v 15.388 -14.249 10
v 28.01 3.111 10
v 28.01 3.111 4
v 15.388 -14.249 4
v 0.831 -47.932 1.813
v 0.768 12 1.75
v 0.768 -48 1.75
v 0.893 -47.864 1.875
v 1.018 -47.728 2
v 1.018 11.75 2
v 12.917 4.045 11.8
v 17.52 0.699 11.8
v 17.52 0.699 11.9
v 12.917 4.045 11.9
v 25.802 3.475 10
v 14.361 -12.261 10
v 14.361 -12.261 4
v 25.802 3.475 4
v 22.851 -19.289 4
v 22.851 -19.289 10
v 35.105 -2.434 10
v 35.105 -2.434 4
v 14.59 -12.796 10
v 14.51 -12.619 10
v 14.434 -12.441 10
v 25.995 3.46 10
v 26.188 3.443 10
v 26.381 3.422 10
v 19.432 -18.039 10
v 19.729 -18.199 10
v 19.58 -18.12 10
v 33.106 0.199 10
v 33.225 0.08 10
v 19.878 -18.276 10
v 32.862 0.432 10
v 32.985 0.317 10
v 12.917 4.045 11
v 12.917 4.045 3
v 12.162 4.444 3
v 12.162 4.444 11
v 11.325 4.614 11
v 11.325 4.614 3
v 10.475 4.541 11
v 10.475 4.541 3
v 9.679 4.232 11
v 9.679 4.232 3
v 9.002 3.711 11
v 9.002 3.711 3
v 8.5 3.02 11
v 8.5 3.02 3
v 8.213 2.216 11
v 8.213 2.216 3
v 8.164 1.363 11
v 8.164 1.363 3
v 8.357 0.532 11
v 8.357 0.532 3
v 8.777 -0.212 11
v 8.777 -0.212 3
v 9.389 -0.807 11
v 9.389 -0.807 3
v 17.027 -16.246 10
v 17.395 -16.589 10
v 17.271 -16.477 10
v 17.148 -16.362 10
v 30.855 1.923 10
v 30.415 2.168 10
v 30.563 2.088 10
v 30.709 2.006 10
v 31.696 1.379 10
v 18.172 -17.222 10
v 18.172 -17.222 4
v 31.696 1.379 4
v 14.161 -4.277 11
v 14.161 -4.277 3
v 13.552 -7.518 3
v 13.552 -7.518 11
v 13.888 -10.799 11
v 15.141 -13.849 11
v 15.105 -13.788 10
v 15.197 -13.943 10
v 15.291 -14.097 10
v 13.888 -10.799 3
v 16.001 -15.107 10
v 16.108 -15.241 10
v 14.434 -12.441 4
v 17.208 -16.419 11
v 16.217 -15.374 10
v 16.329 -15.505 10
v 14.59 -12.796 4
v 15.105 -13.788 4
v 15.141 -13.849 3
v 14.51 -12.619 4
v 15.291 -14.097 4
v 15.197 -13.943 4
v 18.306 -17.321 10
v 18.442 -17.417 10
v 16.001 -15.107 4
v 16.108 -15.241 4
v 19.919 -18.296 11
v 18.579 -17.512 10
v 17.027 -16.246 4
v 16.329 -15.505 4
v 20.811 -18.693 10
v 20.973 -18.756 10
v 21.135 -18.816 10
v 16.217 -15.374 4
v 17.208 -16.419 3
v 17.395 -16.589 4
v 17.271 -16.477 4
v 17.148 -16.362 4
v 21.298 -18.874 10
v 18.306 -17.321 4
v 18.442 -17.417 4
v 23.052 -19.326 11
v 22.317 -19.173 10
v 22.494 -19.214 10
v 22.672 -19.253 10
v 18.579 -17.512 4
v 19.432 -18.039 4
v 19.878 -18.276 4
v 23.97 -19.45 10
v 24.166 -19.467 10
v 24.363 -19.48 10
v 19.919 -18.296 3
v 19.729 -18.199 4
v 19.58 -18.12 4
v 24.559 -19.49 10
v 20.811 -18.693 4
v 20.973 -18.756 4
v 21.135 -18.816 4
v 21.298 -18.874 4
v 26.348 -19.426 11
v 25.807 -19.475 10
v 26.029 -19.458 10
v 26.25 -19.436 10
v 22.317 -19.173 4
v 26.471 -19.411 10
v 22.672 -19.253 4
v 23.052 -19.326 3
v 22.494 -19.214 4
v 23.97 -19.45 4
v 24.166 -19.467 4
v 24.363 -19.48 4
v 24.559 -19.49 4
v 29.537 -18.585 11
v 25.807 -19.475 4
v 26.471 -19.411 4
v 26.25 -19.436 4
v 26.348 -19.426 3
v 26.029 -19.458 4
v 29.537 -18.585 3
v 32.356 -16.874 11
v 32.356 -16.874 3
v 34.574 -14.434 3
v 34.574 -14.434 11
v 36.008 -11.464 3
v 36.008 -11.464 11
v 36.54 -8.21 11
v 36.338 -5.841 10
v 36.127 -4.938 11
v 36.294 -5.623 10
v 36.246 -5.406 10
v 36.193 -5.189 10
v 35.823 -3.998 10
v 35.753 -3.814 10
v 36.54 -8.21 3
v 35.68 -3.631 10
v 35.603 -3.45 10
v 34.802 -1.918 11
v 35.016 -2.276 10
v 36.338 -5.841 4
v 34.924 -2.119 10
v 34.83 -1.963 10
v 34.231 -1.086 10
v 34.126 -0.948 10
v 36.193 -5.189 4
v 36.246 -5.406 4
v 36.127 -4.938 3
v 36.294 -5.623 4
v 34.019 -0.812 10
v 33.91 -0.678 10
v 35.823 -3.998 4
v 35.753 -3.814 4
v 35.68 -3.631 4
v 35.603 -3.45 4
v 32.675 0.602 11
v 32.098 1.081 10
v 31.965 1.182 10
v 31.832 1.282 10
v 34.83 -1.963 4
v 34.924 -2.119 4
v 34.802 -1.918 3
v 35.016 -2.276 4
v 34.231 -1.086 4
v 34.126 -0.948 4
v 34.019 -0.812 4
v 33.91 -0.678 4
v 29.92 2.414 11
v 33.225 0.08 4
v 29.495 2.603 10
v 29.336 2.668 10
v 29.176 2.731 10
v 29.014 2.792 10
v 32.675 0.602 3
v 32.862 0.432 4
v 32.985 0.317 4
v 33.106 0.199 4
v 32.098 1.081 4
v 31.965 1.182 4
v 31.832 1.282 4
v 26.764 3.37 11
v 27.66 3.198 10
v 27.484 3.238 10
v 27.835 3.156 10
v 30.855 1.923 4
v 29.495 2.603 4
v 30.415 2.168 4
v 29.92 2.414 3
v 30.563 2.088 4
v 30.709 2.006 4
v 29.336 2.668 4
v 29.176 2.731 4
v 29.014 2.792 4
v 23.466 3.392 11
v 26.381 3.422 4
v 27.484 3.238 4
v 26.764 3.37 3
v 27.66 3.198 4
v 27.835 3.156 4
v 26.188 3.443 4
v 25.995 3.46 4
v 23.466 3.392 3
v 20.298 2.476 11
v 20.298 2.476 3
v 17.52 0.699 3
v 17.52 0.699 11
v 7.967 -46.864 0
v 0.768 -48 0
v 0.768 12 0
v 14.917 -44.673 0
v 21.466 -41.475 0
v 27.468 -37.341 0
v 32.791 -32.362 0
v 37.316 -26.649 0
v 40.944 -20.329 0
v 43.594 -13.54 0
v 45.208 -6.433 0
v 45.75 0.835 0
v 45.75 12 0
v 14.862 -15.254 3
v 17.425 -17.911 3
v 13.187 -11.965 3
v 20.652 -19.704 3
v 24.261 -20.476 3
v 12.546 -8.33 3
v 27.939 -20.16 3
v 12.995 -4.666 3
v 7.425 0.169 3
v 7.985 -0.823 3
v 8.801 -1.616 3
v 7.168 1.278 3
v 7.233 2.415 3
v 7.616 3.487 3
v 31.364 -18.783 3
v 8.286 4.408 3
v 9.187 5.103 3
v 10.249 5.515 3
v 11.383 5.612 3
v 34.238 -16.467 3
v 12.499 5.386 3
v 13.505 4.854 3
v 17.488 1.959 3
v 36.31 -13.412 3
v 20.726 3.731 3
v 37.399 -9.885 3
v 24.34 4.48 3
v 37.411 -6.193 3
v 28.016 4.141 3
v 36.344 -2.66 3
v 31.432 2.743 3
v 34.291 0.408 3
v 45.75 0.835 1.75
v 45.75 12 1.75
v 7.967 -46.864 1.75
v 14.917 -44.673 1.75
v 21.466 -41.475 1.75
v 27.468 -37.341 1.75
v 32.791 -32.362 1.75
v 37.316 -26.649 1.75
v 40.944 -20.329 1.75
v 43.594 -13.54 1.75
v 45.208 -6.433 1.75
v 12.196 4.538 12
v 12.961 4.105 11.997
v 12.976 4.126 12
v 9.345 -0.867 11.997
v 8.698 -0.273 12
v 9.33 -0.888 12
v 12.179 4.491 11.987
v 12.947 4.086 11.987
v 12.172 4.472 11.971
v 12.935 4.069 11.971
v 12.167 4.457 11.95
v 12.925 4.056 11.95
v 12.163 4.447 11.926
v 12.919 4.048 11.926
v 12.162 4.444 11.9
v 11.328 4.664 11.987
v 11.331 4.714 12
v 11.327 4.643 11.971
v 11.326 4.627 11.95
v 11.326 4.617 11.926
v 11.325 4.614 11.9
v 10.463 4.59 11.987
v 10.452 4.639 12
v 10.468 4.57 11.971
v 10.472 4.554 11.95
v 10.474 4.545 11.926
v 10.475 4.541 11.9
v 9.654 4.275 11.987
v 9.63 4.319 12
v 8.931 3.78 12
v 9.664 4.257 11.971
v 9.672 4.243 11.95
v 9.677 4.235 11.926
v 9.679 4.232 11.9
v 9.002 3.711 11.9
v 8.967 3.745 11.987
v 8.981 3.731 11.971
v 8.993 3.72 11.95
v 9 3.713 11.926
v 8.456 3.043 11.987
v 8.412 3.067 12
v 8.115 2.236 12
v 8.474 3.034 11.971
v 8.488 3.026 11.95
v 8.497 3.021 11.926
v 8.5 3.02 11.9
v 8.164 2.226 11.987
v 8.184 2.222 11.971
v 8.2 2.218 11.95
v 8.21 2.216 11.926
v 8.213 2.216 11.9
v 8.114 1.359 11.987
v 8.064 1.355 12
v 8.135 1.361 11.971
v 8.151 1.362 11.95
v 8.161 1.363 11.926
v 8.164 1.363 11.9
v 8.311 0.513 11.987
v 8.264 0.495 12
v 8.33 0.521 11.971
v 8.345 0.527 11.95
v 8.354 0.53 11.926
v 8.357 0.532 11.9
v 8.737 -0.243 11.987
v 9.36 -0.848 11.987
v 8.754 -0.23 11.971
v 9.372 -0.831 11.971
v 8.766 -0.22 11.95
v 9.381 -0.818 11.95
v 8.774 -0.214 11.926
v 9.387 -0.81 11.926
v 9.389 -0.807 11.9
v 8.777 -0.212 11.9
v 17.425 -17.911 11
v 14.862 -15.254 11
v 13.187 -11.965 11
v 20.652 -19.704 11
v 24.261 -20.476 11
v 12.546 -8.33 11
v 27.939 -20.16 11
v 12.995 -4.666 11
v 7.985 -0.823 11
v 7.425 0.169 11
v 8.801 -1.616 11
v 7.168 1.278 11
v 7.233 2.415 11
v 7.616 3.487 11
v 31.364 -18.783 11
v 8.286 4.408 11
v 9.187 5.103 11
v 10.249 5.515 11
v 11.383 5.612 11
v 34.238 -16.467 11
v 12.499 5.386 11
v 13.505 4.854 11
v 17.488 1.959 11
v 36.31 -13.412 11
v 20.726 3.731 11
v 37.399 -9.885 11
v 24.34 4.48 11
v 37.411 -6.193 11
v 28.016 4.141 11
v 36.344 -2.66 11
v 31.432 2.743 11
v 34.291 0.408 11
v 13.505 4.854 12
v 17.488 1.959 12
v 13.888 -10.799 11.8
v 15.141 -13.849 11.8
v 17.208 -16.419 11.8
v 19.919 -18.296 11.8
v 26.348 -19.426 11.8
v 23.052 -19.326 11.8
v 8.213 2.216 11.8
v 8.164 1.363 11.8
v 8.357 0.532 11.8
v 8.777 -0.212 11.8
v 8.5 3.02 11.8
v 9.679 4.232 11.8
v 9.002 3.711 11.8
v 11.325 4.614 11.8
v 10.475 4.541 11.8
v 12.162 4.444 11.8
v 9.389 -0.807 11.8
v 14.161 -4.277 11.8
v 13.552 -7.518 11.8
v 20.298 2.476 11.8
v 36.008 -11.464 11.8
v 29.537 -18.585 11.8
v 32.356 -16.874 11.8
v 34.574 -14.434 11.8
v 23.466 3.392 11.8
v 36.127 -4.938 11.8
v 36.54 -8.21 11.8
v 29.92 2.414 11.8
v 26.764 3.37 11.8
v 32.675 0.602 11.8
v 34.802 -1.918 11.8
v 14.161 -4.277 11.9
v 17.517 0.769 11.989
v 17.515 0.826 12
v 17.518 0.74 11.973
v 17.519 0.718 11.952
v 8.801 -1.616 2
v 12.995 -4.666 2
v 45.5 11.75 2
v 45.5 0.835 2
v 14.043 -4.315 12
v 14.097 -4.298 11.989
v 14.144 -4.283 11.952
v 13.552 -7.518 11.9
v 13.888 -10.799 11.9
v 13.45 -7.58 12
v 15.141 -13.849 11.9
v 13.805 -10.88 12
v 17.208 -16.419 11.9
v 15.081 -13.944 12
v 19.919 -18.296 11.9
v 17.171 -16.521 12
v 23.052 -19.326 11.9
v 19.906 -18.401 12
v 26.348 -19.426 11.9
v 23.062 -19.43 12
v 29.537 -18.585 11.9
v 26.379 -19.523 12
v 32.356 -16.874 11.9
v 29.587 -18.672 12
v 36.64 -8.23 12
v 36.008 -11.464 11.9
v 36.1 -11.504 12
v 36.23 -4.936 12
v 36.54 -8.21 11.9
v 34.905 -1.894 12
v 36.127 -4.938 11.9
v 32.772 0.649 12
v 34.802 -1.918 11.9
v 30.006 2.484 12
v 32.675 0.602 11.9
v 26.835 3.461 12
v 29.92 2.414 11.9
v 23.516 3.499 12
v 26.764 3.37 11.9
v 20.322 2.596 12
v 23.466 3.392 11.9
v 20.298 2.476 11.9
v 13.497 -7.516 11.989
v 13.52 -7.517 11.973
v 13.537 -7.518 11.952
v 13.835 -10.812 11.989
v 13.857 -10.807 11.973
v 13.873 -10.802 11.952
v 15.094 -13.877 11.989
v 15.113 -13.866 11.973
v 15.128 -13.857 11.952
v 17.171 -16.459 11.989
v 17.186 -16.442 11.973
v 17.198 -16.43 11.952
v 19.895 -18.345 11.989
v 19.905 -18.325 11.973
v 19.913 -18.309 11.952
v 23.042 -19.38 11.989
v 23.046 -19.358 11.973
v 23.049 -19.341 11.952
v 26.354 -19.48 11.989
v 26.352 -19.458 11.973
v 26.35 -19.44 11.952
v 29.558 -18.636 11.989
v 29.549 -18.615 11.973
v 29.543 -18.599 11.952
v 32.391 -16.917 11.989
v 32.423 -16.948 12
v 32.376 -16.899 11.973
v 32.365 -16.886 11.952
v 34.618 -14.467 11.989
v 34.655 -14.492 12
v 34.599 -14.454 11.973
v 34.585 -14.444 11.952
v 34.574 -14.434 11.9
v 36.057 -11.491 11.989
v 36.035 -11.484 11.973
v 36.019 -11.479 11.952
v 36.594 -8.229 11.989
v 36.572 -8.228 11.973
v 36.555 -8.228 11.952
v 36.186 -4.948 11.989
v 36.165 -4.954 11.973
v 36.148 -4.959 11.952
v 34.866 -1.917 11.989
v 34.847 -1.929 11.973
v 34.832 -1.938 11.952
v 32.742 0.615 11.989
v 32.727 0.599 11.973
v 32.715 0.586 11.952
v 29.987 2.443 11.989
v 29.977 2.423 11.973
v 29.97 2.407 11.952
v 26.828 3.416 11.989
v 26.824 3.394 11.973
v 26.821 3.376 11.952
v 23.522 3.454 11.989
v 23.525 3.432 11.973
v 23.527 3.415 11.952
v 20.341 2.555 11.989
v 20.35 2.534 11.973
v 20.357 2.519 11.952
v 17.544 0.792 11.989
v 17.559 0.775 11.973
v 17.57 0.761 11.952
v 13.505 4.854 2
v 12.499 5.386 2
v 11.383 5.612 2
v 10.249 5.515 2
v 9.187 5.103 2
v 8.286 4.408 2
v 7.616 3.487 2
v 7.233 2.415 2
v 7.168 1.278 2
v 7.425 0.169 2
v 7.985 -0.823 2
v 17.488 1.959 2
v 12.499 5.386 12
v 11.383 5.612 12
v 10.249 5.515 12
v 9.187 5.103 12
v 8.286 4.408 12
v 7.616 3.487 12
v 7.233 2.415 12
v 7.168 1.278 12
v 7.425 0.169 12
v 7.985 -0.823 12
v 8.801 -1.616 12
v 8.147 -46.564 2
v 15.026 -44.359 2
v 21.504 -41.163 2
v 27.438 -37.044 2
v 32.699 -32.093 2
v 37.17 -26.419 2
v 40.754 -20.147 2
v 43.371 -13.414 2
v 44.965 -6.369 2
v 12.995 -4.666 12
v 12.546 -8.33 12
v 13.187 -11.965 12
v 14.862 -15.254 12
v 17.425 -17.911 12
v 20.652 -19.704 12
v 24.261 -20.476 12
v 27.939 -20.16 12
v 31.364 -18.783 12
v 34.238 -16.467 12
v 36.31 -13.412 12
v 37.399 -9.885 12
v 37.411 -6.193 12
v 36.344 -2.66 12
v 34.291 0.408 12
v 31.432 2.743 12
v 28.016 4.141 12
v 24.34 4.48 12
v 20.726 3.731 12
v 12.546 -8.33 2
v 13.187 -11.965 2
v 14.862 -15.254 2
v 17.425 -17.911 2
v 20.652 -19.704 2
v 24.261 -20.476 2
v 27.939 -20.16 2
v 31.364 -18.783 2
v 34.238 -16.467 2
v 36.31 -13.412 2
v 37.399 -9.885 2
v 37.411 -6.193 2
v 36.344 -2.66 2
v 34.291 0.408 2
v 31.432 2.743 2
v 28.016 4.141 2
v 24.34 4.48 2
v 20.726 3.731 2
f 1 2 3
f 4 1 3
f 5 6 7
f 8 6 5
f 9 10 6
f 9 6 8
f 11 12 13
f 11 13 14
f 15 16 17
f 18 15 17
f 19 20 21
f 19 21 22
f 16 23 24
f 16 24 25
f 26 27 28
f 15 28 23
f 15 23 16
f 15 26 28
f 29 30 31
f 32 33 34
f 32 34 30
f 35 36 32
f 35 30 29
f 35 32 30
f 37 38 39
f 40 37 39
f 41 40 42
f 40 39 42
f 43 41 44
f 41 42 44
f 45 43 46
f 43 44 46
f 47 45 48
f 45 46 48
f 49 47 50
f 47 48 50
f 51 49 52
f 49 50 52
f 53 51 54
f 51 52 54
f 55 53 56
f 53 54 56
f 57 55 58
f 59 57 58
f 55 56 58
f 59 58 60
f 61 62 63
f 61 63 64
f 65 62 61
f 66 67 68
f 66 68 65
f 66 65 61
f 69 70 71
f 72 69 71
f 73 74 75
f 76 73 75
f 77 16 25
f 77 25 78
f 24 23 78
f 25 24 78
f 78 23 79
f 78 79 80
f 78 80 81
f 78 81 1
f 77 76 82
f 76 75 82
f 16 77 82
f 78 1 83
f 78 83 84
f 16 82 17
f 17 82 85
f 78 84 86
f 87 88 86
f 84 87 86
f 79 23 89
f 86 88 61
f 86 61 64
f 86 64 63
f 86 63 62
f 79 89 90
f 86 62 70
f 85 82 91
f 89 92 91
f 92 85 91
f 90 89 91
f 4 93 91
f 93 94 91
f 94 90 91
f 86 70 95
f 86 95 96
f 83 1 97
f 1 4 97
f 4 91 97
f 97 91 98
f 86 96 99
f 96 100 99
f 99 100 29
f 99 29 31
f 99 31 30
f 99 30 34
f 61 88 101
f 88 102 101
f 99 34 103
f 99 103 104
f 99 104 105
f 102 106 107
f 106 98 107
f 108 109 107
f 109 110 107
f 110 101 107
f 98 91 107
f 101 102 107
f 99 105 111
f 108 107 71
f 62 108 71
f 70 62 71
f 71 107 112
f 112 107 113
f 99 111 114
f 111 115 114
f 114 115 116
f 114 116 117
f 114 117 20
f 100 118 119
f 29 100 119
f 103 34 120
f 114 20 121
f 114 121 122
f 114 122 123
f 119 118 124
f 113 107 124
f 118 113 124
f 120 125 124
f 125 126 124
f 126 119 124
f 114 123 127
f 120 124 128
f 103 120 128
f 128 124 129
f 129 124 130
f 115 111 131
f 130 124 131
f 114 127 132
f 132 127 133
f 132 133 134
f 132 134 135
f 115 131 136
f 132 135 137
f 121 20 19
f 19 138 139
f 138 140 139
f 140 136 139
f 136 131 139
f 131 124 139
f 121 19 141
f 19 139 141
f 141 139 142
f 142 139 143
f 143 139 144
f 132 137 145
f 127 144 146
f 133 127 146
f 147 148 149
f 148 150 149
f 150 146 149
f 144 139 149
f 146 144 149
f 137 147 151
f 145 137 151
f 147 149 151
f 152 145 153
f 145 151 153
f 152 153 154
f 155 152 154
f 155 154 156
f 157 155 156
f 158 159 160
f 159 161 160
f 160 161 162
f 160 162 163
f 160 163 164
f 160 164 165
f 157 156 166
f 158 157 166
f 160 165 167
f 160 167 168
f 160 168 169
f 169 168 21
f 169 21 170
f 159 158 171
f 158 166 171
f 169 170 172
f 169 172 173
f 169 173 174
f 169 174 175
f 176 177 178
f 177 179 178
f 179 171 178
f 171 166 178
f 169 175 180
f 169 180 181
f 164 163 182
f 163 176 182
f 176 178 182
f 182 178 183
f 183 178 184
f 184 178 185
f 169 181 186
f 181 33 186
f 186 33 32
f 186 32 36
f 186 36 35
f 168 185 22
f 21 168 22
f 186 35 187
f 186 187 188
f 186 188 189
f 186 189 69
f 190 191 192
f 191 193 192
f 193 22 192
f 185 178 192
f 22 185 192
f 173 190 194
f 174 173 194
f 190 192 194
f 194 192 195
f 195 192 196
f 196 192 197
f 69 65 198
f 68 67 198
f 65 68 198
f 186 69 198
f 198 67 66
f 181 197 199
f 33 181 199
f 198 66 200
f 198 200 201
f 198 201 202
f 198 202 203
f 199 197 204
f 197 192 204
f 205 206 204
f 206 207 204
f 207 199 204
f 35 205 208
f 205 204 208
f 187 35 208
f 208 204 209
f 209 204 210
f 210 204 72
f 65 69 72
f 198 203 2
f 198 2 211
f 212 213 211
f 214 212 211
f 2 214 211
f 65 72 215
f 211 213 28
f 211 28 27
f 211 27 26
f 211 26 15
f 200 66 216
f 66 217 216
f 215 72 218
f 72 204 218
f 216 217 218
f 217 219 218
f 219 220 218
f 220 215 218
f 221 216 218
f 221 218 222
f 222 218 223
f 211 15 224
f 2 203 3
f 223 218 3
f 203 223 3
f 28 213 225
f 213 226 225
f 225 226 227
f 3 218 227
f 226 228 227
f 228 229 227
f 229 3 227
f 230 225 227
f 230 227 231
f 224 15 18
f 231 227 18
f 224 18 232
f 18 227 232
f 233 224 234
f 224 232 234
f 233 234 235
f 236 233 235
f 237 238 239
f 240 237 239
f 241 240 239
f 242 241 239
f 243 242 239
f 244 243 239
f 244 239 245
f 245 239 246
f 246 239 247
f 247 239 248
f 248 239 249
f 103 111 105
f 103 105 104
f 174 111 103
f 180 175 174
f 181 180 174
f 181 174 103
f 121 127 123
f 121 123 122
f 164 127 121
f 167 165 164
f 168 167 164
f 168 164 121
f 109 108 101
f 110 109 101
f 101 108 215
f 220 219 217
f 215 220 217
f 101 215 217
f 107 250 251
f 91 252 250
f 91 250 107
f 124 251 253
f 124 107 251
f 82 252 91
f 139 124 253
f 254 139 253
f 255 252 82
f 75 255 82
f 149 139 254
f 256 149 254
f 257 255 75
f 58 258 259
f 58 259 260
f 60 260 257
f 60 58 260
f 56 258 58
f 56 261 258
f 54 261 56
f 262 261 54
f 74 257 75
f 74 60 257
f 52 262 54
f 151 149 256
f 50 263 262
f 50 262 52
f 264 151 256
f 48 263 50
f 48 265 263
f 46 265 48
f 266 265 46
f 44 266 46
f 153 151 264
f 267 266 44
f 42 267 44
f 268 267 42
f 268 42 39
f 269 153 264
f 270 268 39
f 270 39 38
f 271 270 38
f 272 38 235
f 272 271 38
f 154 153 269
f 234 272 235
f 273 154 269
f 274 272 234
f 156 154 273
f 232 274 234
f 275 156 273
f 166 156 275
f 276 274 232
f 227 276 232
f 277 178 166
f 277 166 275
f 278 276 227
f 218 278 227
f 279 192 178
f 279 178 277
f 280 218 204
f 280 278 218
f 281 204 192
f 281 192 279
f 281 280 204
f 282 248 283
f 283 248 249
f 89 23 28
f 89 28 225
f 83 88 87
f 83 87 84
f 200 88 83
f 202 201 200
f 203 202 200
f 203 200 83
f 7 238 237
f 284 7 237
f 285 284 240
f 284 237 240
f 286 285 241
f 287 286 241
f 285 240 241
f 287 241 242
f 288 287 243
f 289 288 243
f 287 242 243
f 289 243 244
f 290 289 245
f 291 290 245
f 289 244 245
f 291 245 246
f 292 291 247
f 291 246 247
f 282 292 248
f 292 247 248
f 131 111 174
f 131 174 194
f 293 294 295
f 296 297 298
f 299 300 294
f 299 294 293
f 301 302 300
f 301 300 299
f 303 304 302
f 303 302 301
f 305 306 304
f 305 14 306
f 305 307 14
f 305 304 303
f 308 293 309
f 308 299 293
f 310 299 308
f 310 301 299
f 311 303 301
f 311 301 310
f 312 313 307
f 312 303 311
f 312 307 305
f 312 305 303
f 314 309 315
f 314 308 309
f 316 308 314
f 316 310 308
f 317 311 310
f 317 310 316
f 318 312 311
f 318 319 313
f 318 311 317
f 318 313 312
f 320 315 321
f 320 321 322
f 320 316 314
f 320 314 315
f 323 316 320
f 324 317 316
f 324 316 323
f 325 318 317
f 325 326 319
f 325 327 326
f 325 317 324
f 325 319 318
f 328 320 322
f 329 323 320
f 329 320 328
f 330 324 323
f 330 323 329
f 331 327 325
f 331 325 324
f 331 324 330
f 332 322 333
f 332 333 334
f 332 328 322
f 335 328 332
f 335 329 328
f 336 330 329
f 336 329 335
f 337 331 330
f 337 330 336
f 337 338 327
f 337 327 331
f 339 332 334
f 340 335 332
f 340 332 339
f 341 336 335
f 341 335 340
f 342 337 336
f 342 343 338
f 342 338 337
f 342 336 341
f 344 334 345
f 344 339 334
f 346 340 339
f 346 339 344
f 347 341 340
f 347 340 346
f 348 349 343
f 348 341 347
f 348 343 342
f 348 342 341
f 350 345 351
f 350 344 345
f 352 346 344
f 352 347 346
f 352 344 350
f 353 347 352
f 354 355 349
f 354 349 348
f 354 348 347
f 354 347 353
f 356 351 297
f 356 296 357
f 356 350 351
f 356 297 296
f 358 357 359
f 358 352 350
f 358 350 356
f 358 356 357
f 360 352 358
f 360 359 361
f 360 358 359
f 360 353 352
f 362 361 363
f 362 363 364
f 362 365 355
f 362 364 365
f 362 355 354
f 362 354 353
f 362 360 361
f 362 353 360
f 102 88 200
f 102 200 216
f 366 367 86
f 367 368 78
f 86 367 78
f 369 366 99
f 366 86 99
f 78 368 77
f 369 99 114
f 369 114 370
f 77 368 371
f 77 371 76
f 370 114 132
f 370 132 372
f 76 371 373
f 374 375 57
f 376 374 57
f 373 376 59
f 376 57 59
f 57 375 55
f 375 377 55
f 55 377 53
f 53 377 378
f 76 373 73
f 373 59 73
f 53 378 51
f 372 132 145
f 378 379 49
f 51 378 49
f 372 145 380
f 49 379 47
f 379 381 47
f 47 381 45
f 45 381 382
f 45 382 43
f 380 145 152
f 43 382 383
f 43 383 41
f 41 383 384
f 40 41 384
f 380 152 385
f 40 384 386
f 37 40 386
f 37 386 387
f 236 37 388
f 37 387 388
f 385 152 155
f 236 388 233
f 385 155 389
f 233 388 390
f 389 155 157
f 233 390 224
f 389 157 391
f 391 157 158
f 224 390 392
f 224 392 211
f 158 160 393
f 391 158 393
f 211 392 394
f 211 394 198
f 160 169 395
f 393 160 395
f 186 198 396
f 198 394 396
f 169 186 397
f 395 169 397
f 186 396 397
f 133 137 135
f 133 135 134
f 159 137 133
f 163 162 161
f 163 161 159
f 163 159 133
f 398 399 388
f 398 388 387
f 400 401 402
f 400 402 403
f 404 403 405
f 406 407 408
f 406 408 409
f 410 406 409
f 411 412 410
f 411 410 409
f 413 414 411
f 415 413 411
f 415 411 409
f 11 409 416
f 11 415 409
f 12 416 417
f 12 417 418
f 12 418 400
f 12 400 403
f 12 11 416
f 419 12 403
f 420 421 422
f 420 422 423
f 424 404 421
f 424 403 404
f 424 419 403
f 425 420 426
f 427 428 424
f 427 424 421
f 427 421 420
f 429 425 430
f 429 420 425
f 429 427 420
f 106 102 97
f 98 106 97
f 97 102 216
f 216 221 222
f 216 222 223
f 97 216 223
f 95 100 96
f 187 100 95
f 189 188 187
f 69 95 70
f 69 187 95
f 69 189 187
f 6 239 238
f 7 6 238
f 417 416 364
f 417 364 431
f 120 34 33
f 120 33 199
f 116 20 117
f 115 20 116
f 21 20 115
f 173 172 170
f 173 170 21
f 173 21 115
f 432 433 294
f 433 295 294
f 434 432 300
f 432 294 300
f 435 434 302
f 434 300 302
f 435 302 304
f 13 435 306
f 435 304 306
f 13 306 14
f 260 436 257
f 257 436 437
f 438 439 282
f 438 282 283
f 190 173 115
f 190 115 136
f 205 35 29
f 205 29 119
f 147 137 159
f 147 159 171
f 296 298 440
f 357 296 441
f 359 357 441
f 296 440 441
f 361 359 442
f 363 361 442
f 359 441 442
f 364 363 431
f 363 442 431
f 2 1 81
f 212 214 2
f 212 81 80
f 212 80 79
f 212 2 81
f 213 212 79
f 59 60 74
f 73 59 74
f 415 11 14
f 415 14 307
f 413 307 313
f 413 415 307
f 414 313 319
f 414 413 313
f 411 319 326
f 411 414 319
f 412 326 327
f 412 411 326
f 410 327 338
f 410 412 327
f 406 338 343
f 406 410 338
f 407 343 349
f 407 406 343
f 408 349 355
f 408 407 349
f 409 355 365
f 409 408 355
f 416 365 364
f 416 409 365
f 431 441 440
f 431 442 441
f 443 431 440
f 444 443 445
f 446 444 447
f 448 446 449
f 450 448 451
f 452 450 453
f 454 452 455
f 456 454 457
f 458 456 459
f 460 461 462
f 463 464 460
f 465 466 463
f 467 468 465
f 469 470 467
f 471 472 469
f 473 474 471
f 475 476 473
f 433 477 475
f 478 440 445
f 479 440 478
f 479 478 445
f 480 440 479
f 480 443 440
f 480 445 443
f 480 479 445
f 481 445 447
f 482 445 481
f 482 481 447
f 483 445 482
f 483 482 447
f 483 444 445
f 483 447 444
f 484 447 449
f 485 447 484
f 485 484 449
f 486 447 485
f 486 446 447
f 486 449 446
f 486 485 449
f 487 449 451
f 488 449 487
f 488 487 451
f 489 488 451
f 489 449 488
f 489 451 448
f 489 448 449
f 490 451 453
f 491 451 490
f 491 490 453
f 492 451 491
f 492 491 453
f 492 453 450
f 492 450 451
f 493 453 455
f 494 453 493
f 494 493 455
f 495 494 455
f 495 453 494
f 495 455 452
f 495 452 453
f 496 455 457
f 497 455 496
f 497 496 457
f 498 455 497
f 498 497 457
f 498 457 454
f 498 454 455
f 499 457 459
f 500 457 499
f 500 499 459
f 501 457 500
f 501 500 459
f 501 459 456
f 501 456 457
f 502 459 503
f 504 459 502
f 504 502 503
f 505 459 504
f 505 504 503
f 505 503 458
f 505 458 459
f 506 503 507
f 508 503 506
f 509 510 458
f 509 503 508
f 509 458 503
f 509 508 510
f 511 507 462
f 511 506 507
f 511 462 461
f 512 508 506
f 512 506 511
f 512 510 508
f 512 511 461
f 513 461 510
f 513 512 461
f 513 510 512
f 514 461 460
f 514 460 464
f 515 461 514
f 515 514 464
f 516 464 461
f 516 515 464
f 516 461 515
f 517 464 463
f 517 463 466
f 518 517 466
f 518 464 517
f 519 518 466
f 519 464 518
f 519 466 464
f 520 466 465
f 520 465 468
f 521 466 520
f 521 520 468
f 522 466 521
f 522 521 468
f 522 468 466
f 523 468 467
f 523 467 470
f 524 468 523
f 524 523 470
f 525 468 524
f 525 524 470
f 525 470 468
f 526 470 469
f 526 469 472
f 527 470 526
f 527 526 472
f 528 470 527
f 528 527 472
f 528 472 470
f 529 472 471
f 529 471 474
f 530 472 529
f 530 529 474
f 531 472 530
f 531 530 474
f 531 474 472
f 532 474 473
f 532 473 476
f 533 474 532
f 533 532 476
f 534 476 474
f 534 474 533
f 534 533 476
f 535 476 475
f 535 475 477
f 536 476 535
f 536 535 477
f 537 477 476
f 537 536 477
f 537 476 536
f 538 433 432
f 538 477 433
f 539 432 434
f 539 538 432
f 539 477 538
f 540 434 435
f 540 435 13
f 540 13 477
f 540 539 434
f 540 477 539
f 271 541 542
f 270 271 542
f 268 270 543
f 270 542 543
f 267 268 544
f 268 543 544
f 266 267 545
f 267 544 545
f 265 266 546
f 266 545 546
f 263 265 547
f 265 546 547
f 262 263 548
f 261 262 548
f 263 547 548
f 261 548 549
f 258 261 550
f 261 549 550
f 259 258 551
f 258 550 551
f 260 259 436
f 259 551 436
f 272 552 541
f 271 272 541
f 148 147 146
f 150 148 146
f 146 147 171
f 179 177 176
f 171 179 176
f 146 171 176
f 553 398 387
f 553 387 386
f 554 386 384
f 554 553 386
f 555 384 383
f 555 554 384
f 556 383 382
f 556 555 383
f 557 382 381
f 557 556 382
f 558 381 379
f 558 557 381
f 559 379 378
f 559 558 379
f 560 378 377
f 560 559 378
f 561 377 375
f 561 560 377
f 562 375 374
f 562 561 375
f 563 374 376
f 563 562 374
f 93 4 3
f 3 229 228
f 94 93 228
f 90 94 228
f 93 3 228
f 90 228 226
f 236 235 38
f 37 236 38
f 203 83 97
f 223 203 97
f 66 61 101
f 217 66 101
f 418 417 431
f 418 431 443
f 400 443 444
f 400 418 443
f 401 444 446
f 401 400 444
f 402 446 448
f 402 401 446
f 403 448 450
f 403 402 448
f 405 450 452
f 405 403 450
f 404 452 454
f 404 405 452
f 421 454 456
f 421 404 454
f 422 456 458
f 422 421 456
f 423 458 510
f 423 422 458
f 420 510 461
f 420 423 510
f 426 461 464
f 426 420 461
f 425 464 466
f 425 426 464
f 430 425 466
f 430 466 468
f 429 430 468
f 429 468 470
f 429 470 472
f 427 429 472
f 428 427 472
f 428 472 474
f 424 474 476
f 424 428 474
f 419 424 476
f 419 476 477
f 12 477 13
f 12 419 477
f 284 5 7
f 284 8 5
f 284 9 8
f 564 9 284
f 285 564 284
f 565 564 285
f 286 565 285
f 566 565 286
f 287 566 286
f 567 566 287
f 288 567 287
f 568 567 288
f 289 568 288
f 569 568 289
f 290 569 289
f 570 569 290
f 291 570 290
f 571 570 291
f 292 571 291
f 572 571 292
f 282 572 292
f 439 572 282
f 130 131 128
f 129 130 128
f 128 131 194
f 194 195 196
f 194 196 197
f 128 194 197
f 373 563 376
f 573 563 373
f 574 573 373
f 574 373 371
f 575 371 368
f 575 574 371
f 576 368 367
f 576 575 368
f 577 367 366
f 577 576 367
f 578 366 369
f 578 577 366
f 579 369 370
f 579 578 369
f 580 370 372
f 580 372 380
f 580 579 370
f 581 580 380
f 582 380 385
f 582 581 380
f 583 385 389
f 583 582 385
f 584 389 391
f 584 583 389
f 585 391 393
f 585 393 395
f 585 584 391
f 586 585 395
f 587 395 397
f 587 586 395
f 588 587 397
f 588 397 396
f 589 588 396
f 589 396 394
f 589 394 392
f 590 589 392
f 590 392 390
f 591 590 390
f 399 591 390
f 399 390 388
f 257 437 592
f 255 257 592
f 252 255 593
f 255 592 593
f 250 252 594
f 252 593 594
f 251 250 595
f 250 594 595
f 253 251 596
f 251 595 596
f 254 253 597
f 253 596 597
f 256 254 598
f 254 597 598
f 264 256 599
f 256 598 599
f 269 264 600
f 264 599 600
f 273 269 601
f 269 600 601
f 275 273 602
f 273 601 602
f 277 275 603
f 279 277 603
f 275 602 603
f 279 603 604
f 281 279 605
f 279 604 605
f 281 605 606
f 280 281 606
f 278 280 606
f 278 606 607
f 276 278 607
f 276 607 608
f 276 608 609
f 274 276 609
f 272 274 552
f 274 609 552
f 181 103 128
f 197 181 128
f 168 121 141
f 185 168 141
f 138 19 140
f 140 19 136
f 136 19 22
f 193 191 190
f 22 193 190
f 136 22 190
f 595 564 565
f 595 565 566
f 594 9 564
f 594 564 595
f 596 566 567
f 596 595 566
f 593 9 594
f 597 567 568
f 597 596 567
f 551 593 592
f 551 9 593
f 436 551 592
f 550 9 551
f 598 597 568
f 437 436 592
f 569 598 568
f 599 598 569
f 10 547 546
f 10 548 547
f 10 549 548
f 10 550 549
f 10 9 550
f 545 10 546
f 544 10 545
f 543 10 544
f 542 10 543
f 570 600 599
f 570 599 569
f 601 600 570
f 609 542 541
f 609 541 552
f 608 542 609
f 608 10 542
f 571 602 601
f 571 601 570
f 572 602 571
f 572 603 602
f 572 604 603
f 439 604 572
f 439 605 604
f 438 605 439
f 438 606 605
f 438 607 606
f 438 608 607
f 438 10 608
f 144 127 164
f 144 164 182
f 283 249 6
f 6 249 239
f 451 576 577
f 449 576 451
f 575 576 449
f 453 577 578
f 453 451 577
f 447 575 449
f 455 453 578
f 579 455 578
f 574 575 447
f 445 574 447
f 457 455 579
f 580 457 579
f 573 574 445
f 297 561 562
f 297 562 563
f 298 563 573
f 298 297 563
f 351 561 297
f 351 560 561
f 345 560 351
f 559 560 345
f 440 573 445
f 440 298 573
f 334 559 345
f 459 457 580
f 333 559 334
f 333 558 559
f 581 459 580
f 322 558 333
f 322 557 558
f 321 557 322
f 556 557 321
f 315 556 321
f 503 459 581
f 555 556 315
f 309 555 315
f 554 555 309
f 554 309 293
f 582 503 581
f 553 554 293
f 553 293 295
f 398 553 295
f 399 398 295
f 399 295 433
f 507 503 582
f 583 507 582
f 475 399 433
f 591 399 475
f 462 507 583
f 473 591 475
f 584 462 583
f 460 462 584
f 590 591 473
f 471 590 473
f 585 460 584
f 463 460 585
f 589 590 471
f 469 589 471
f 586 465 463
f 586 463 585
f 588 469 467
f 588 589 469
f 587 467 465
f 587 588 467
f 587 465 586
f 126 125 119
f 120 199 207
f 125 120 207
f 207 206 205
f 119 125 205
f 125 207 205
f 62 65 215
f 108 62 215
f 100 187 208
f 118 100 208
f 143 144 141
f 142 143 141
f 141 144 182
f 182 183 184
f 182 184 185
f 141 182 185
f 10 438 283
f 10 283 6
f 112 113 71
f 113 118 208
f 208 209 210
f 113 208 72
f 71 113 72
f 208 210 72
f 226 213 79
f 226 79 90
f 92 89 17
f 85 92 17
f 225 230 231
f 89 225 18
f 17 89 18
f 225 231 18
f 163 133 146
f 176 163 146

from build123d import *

# Parameters (mm, degrees)
BOSS_EXTRUDE1_DEPTH         = 2
BOSS_EXTRUDE2_DEPTH         = 1
CHAMFER1_SIZE               = 0.25
BOSS_EXTRUDE3_DEPTH         = 8
CUT_EXTRUDE_THIN1_START     = -11.887644895
CUT_EXTRUDE_THIN1_OUTLINE_W = 0.5
CUT_EXTRUDE_THIN1_OUTLINE_H = 6
CUT_EXTRUDE_THIN1_DEPTH     = 23
CUT_EXTRUDE1_START          = -0.2
CUT_EXTRUDE1_DEPTH          = 0.2
FILLET1_R                   = 0.1


# Read off the part's stored shape, not the designer's step: Cut-Extrude-Thin1
with BuildPart() as part:
    # Sketch1 → Boss-Extrude1 (new body)
    with BuildSketch(Plane.XY):
        with BuildLine():
            Line((0.767949192, 12), (0.767949192, -48))
            ThreePointArc((0.767949192, -48), (32.790806806, -32.362304412), (45.75, 0.834988321))
            Line((45.75, 0.834988321), (45.75, 12))
            Line((45.75, 12), (0.767949192, 12))
        make_face()
    extrude(amount=BOSS_EXTRUDE1_DEPTH)

    # Sketch2 → Boss-Extrude2 (add)
    with BuildSketch(Plane.XY.offset(2)):
        with BuildLine():
            Line((8.80088089, -1.616278944), (12.994920502, -4.6656628))
            ThreePointArc((12.994920502, -4.6656628), (35.387361749, -15.015949775), (17.487536068, 1.958917118))
            Line((17.487536068, 1.958917118), (13.505420168, 4.854216415))
            ThreePointArc((13.505420168, 4.854216415), (7.91790285, 3.971238374), (8.80088089, -1.616278944))
        make_face()
    boss_extrude2 = extrude(amount=BOSS_EXTRUDE2_DEPTH)

    # Chamfer1
    chamfer1_edges = [part.edges().sort_by_distance(p)[0] for p in [
        (32.790806806, -32.362304412, 2),
        (45.75, 6.41749416, 2),
        (23.258974596, 12, 2),
        (0.767949192, -18, 2),
    ]]
    chamfer(chamfer1_edges, length=CHAMFER1_SIZE)

    # Sketch4 → Boss-Extrude3 (add)
    with BuildSketch(Plane.XY.offset(3)):
        with BuildLine():
            Line((17.520070281, 0.698880903), (12.917352758, 4.045404495))
            ThreePointArc((12.917352758, 4.045404495), (8.726714769, 3.383170965), (9.3889483, -0.807467024))
            Line((9.3889483, -0.807467024), (14.161225934, -4.277273635))
            ThreePointArc((14.161225934, -4.277273635), (34.573815964, -14.433858921), (17.520070281, 0.698880903))
        make_face()
    extrude(amount=BOSS_EXTRUDE3_DEPTH)

    # Mirror1: Boss-Extrude2 across plane
    add(boss_extrude2.mirror(Plane.XY.offset(7)))

    # Cut-Extrude-Thin1 outline → Cut-Extrude-Thin1 (cut)
    with BuildSketch(Plane(origin=(4.627058781, 6.363930791, 0), x_dir=(-0.8088119198432459, 0.5880674096729752, 0), z_dir=(-0.5880674096729752, -0.8088119198432459, 0)).offset(CUT_EXTRUDE_THIN1_START)):
        with Locations((-32.575215368, -7)):
            Rectangle(CUT_EXTRUDE_THIN1_OUTLINE_W, CUT_EXTRUDE_THIN1_OUTLINE_H)
        with Locations((-29.575215368, -7)):
            Rectangle(CUT_EXTRUDE_THIN1_OUTLINE_W, CUT_EXTRUDE_THIN1_OUTLINE_H)
        with Locations((-26.575215368, -7)):
            Rectangle(CUT_EXTRUDE_THIN1_OUTLINE_W, CUT_EXTRUDE_THIN1_OUTLINE_H)
        with Locations((-23.575215368, -7)):
            Rectangle(CUT_EXTRUDE_THIN1_OUTLINE_W, CUT_EXTRUDE_THIN1_OUTLINE_H)
        with Locations((-31.075215368, -7)):
            Rectangle(CUT_EXTRUDE_THIN1_OUTLINE_W, CUT_EXTRUDE_THIN1_OUTLINE_H)
        with Locations((-28.075215368, -7)):
            Rectangle(CUT_EXTRUDE_THIN1_OUTLINE_W, CUT_EXTRUDE_THIN1_OUTLINE_H)
        with Locations((-25.075215368, -7)):
            Rectangle(CUT_EXTRUDE_THIN1_OUTLINE_W, CUT_EXTRUDE_THIN1_OUTLINE_H)
        with Locations((-22.075215368, -7)):
            Rectangle(CUT_EXTRUDE_THIN1_OUTLINE_W, CUT_EXTRUDE_THIN1_OUTLINE_H)
        with Locations((-20.575215368, -7)):
            Rectangle(CUT_EXTRUDE_THIN1_OUTLINE_W, CUT_EXTRUDE_THIN1_OUTLINE_H)
        with Locations((-19.075215368, -7)):
            Rectangle(CUT_EXTRUDE_THIN1_OUTLINE_W, CUT_EXTRUDE_THIN1_OUTLINE_H)
    extrude(amount=CUT_EXTRUDE_THIN1_DEPTH, mode=Mode.SUBTRACT)

    # Sketch9 → Cut-Extrude1 (cut)
    with BuildSketch(Plane.XY.offset(12).offset(CUT_EXTRUDE1_START)):
        with BuildLine():
            Line((17.520070281, 0.698880903), (12.917352758, 4.045404495))
            ThreePointArc((12.917352758, 4.045404495), (8.726714769, 3.383170965), (9.3889483, -0.807467024))
            Line((9.3889483, -0.807467024), (14.161225934, -4.277273635))
            ThreePointArc((14.161225934, -4.277273635), (34.573815964, -14.433858921), (17.520070281, 0.698880903))
        make_face()
    extrude(amount=CUT_EXTRUDE1_DEPTH, mode=Mode.SUBTRACT)

    # Fillet1
    fillet1_edges = [part.edges().sort_by_distance(p)[0] for p in [
        (8.726714769, 3.383170965, 12),
        (11.775087117, -2.542370329, 12),
        (34.573815964, -14.433858921, 12),
        (15.21871152, 2.372142699, 12),
    ]]
    fillet(fillet1_edges, radius=FILLET1_R)


solid = part.part
